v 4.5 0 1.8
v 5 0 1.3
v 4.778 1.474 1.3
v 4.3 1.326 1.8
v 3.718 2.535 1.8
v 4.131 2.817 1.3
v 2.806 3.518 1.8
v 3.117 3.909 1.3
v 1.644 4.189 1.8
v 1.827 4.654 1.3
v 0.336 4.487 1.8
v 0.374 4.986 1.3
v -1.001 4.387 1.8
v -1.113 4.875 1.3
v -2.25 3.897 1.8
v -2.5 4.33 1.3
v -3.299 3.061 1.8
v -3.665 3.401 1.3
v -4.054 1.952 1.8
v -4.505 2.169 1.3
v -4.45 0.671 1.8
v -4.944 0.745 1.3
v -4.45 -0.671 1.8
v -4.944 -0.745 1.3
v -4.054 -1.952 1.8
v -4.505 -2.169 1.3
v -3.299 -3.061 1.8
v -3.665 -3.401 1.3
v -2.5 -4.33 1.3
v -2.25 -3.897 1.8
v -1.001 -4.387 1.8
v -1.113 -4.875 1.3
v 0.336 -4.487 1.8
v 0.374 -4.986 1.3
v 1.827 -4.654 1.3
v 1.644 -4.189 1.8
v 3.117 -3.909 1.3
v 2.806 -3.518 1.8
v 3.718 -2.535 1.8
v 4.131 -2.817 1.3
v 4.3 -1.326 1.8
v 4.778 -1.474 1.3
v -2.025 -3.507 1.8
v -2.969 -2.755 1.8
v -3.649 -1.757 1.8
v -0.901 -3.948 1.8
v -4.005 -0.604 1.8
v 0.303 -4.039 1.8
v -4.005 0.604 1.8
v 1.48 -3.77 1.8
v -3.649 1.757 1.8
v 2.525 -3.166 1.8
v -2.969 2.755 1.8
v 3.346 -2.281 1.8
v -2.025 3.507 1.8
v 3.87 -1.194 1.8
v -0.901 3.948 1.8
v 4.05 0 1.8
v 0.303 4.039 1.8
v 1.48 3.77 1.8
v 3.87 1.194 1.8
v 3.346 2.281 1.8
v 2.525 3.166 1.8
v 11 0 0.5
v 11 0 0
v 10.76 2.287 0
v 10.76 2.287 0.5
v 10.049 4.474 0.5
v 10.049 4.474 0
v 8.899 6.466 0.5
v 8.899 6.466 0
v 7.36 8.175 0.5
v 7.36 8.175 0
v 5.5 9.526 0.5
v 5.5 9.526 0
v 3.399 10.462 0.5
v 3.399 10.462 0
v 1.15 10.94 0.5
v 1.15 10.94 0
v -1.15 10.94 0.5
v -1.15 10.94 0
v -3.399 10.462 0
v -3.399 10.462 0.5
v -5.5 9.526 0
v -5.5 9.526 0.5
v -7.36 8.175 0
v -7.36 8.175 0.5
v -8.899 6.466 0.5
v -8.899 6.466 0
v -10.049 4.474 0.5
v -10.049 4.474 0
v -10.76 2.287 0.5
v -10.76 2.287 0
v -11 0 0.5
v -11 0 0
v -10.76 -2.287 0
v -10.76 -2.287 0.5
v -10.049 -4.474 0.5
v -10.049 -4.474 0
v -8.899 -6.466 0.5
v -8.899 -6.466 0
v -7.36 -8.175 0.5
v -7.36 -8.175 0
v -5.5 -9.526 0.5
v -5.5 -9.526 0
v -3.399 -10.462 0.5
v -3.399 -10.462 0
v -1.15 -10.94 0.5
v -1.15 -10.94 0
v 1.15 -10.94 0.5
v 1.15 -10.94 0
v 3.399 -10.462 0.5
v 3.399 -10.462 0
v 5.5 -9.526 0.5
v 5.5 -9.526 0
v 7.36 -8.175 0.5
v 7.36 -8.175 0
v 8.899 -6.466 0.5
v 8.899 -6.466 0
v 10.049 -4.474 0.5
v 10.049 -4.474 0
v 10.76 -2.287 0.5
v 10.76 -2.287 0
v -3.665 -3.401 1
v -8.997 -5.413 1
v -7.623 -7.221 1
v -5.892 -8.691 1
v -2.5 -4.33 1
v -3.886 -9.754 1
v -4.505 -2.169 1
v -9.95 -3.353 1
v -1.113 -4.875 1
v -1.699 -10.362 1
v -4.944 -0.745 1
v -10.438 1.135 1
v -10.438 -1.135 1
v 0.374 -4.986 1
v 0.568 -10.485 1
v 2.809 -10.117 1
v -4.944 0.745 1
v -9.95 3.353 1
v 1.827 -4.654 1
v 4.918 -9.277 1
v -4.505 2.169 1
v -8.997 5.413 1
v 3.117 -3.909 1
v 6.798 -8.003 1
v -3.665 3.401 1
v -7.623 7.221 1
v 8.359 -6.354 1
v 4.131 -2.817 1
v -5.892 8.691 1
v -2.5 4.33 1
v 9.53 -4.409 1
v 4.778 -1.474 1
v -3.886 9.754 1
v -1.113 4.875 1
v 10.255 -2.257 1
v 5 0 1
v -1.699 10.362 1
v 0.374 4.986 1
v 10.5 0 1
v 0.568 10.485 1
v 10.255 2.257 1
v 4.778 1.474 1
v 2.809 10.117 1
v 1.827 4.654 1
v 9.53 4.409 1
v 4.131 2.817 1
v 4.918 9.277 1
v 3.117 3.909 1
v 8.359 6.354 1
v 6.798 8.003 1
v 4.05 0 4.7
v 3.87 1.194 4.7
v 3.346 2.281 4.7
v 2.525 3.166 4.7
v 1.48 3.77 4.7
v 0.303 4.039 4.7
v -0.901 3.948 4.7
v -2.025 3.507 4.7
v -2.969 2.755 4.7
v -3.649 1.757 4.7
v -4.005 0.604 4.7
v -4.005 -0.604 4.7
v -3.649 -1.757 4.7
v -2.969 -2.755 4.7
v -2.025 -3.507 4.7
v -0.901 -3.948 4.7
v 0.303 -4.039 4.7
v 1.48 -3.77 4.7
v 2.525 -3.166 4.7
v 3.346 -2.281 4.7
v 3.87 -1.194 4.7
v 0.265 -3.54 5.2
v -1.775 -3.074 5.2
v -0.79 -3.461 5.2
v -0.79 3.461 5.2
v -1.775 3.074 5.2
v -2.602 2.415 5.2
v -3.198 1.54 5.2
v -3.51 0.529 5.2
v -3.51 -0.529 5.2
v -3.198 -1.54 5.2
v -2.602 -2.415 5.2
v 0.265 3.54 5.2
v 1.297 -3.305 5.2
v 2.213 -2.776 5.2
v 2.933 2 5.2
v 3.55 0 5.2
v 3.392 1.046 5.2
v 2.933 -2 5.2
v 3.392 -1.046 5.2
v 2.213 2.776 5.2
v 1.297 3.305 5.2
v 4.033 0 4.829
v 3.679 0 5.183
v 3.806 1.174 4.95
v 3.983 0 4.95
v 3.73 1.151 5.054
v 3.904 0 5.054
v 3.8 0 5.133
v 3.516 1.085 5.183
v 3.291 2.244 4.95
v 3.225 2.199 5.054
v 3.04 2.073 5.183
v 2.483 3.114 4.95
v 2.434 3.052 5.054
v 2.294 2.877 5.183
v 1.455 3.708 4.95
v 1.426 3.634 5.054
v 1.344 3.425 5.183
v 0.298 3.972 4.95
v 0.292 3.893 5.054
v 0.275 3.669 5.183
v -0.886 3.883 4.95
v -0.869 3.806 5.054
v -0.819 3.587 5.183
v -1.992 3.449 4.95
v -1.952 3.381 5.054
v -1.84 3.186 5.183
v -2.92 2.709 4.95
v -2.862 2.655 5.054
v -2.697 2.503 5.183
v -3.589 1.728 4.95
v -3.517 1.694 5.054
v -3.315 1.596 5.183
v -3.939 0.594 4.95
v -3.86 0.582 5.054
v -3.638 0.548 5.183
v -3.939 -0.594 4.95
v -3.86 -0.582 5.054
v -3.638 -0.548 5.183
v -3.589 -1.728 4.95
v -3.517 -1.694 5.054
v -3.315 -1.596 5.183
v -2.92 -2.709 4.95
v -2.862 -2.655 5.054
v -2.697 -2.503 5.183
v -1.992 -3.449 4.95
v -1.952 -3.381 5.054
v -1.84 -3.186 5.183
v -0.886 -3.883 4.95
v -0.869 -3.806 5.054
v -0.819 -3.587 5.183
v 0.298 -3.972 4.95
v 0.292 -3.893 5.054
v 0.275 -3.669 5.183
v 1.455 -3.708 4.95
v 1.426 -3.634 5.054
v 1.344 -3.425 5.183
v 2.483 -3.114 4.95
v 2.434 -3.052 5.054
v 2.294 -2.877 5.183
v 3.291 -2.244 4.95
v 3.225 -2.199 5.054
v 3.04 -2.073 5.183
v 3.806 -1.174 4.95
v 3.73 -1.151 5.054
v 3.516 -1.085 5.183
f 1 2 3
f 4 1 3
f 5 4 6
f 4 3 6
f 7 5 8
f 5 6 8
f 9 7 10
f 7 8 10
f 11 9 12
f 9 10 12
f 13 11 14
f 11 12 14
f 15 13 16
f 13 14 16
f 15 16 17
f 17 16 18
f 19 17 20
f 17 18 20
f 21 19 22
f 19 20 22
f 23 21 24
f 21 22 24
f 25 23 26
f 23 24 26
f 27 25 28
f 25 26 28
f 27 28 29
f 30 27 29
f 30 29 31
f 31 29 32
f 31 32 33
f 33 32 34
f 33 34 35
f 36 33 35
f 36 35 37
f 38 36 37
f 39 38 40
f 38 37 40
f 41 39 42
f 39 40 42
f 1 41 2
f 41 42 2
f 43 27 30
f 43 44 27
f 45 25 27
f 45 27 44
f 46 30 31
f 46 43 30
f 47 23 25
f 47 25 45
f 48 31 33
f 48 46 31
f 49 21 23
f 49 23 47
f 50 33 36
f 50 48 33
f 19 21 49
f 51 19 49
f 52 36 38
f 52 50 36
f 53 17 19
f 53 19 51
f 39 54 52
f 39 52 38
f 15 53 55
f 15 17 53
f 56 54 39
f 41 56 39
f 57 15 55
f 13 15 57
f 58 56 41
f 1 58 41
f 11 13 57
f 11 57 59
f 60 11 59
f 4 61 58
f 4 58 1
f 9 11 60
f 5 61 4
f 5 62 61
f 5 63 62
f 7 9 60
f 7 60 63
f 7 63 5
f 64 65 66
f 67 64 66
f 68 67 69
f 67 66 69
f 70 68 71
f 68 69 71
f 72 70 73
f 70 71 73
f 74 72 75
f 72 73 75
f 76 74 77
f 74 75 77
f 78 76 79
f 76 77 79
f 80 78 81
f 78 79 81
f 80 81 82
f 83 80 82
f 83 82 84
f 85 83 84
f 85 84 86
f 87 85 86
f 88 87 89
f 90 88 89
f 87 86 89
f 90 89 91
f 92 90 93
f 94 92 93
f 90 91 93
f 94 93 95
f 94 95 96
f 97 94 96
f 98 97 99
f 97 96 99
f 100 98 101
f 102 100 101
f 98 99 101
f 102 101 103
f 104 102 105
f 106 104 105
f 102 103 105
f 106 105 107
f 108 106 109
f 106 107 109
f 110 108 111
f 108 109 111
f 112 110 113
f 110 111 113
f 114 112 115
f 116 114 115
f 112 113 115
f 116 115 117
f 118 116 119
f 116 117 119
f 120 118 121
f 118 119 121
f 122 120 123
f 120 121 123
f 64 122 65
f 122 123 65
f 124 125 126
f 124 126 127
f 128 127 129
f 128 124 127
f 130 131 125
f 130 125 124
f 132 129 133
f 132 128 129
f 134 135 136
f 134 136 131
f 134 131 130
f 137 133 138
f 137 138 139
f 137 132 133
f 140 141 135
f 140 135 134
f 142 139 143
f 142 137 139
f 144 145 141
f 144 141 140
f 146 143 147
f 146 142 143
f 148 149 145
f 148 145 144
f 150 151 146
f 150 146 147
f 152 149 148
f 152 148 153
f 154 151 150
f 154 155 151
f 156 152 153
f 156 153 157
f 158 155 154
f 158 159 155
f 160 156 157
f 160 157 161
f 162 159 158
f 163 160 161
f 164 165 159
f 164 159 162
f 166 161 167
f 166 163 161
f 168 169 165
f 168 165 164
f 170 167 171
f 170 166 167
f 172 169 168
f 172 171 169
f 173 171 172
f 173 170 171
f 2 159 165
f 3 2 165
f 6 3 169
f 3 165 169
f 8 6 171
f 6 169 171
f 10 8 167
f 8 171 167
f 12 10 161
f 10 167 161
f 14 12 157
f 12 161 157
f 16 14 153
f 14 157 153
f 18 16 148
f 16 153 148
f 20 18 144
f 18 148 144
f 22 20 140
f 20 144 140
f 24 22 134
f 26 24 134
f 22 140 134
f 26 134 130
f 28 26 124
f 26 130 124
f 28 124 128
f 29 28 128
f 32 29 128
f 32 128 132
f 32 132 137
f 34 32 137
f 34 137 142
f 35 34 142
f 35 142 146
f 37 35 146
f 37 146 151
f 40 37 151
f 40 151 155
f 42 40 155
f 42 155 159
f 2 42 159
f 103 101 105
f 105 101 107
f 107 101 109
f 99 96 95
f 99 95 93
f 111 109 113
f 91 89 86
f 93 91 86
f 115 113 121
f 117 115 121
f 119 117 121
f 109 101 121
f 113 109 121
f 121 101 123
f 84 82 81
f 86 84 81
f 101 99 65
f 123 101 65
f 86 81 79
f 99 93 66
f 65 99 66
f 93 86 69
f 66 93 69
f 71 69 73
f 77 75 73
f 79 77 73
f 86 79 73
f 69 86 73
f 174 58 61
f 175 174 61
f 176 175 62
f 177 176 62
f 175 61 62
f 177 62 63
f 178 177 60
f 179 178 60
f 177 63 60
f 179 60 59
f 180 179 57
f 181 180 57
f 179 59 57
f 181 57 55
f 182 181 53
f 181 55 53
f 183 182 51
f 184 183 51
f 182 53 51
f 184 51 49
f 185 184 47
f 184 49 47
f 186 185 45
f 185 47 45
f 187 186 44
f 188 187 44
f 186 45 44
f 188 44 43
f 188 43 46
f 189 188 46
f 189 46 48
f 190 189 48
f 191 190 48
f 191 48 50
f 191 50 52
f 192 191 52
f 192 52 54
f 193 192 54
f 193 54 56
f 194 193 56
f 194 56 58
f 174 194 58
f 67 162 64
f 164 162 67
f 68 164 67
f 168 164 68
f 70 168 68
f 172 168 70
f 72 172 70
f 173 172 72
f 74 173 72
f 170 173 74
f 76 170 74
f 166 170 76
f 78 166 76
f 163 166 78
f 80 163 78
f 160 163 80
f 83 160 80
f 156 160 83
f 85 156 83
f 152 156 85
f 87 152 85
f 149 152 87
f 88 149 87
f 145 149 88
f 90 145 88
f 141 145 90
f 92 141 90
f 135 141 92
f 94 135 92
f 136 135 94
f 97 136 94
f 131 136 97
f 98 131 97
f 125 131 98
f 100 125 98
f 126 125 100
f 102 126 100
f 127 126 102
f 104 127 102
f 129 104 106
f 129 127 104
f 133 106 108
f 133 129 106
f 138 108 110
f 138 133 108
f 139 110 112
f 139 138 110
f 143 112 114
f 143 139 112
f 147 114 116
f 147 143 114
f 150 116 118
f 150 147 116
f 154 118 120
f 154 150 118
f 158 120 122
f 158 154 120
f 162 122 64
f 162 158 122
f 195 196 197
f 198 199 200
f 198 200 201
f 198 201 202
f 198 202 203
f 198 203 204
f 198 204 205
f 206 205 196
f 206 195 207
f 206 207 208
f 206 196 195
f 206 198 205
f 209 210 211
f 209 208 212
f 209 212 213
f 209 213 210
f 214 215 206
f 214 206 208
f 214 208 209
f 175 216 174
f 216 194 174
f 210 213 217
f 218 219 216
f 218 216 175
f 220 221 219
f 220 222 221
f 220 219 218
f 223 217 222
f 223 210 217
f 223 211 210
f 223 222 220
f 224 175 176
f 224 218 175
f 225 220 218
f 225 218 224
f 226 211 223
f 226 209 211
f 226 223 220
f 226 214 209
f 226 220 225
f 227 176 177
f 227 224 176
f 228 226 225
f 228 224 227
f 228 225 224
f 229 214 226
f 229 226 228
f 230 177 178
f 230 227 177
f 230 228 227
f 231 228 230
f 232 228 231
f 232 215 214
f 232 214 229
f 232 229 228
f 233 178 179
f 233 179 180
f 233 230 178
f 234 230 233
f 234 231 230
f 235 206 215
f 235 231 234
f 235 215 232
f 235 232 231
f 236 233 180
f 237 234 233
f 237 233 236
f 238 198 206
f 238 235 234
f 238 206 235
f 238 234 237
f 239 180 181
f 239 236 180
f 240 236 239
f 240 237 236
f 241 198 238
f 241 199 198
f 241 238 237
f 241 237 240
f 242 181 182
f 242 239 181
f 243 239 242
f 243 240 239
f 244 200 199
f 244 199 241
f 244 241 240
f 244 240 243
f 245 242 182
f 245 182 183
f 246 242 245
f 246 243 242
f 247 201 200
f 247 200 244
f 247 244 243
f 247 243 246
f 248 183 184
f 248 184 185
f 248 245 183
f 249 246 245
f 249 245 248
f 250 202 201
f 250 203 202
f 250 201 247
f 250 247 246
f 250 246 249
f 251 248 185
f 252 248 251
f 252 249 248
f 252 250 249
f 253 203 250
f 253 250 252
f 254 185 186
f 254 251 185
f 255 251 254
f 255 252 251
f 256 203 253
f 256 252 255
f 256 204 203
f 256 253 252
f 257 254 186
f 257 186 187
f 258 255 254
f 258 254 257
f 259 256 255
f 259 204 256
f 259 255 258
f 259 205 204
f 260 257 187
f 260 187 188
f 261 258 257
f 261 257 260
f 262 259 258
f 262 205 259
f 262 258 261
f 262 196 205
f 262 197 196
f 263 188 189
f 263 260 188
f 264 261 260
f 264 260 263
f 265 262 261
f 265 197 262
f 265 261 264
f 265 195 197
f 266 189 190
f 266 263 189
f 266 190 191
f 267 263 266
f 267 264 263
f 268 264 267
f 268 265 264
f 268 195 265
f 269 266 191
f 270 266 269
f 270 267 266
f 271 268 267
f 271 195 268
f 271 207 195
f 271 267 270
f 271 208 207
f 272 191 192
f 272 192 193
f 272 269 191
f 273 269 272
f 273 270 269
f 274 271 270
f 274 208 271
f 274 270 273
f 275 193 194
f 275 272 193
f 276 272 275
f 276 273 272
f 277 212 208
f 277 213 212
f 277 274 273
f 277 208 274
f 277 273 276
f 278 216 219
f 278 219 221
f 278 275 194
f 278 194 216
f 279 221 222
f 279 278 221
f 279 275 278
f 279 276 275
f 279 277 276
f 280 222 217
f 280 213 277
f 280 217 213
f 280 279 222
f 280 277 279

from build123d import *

# Parameters (mm, degrees)
F0_R     = 11
F0_R_2   = 5
F1_DEPTH = 1
F2_SIZE  = 0.5
F0_R_3   = 4.05
F3_DEPTH = 1.8
F4_DEPTH = 5.2
F5_R     = 0.5
F6_SIZE  = 0.5


with BuildPart() as f1:
    # F0 (on Top) → F1 (new body)
    with BuildSketch(Plane.XY):
        Circle(F0_R)
        Circle(F0_R_2, mode=Mode.SUBTRACT)
    extrude(amount=F1_DEPTH)

    # F2
    f2_edges = [f1.edges().sort_by_distance(p)[0] for p in [
        (-11, 0, 1),
    ]]
    chamfer(f2_edges, length=F2_SIZE)

    # F0 (on Top) → F3 (join)
    with BuildSketch(Plane.XY):
        Circle(F0_R_2)
        Circle(F0_R_3, mode=Mode.SUBTRACT)
    extrude(amount=F3_DEPTH)

    # F0 (on Top) → F4 (join)
    with BuildSketch(Plane.XY):
        Circle(F0_R_3)
    extrude(amount=F4_DEPTH)

    # F5
    f5_edges = [f1.edges().sort_by_distance(p)[0] for p in [
        (-4.05, 0, 5.2),
    ]]
    fillet(f5_edges, radius=F5_R)

    # F6
    f6_edges = [f1.edges().sort_by_distance(p)[0] for p in [
        (-5, 0, 1.8),
    ]]
    chamfer(f6_edges, length=F6_SIZE)


solid = f1.part
